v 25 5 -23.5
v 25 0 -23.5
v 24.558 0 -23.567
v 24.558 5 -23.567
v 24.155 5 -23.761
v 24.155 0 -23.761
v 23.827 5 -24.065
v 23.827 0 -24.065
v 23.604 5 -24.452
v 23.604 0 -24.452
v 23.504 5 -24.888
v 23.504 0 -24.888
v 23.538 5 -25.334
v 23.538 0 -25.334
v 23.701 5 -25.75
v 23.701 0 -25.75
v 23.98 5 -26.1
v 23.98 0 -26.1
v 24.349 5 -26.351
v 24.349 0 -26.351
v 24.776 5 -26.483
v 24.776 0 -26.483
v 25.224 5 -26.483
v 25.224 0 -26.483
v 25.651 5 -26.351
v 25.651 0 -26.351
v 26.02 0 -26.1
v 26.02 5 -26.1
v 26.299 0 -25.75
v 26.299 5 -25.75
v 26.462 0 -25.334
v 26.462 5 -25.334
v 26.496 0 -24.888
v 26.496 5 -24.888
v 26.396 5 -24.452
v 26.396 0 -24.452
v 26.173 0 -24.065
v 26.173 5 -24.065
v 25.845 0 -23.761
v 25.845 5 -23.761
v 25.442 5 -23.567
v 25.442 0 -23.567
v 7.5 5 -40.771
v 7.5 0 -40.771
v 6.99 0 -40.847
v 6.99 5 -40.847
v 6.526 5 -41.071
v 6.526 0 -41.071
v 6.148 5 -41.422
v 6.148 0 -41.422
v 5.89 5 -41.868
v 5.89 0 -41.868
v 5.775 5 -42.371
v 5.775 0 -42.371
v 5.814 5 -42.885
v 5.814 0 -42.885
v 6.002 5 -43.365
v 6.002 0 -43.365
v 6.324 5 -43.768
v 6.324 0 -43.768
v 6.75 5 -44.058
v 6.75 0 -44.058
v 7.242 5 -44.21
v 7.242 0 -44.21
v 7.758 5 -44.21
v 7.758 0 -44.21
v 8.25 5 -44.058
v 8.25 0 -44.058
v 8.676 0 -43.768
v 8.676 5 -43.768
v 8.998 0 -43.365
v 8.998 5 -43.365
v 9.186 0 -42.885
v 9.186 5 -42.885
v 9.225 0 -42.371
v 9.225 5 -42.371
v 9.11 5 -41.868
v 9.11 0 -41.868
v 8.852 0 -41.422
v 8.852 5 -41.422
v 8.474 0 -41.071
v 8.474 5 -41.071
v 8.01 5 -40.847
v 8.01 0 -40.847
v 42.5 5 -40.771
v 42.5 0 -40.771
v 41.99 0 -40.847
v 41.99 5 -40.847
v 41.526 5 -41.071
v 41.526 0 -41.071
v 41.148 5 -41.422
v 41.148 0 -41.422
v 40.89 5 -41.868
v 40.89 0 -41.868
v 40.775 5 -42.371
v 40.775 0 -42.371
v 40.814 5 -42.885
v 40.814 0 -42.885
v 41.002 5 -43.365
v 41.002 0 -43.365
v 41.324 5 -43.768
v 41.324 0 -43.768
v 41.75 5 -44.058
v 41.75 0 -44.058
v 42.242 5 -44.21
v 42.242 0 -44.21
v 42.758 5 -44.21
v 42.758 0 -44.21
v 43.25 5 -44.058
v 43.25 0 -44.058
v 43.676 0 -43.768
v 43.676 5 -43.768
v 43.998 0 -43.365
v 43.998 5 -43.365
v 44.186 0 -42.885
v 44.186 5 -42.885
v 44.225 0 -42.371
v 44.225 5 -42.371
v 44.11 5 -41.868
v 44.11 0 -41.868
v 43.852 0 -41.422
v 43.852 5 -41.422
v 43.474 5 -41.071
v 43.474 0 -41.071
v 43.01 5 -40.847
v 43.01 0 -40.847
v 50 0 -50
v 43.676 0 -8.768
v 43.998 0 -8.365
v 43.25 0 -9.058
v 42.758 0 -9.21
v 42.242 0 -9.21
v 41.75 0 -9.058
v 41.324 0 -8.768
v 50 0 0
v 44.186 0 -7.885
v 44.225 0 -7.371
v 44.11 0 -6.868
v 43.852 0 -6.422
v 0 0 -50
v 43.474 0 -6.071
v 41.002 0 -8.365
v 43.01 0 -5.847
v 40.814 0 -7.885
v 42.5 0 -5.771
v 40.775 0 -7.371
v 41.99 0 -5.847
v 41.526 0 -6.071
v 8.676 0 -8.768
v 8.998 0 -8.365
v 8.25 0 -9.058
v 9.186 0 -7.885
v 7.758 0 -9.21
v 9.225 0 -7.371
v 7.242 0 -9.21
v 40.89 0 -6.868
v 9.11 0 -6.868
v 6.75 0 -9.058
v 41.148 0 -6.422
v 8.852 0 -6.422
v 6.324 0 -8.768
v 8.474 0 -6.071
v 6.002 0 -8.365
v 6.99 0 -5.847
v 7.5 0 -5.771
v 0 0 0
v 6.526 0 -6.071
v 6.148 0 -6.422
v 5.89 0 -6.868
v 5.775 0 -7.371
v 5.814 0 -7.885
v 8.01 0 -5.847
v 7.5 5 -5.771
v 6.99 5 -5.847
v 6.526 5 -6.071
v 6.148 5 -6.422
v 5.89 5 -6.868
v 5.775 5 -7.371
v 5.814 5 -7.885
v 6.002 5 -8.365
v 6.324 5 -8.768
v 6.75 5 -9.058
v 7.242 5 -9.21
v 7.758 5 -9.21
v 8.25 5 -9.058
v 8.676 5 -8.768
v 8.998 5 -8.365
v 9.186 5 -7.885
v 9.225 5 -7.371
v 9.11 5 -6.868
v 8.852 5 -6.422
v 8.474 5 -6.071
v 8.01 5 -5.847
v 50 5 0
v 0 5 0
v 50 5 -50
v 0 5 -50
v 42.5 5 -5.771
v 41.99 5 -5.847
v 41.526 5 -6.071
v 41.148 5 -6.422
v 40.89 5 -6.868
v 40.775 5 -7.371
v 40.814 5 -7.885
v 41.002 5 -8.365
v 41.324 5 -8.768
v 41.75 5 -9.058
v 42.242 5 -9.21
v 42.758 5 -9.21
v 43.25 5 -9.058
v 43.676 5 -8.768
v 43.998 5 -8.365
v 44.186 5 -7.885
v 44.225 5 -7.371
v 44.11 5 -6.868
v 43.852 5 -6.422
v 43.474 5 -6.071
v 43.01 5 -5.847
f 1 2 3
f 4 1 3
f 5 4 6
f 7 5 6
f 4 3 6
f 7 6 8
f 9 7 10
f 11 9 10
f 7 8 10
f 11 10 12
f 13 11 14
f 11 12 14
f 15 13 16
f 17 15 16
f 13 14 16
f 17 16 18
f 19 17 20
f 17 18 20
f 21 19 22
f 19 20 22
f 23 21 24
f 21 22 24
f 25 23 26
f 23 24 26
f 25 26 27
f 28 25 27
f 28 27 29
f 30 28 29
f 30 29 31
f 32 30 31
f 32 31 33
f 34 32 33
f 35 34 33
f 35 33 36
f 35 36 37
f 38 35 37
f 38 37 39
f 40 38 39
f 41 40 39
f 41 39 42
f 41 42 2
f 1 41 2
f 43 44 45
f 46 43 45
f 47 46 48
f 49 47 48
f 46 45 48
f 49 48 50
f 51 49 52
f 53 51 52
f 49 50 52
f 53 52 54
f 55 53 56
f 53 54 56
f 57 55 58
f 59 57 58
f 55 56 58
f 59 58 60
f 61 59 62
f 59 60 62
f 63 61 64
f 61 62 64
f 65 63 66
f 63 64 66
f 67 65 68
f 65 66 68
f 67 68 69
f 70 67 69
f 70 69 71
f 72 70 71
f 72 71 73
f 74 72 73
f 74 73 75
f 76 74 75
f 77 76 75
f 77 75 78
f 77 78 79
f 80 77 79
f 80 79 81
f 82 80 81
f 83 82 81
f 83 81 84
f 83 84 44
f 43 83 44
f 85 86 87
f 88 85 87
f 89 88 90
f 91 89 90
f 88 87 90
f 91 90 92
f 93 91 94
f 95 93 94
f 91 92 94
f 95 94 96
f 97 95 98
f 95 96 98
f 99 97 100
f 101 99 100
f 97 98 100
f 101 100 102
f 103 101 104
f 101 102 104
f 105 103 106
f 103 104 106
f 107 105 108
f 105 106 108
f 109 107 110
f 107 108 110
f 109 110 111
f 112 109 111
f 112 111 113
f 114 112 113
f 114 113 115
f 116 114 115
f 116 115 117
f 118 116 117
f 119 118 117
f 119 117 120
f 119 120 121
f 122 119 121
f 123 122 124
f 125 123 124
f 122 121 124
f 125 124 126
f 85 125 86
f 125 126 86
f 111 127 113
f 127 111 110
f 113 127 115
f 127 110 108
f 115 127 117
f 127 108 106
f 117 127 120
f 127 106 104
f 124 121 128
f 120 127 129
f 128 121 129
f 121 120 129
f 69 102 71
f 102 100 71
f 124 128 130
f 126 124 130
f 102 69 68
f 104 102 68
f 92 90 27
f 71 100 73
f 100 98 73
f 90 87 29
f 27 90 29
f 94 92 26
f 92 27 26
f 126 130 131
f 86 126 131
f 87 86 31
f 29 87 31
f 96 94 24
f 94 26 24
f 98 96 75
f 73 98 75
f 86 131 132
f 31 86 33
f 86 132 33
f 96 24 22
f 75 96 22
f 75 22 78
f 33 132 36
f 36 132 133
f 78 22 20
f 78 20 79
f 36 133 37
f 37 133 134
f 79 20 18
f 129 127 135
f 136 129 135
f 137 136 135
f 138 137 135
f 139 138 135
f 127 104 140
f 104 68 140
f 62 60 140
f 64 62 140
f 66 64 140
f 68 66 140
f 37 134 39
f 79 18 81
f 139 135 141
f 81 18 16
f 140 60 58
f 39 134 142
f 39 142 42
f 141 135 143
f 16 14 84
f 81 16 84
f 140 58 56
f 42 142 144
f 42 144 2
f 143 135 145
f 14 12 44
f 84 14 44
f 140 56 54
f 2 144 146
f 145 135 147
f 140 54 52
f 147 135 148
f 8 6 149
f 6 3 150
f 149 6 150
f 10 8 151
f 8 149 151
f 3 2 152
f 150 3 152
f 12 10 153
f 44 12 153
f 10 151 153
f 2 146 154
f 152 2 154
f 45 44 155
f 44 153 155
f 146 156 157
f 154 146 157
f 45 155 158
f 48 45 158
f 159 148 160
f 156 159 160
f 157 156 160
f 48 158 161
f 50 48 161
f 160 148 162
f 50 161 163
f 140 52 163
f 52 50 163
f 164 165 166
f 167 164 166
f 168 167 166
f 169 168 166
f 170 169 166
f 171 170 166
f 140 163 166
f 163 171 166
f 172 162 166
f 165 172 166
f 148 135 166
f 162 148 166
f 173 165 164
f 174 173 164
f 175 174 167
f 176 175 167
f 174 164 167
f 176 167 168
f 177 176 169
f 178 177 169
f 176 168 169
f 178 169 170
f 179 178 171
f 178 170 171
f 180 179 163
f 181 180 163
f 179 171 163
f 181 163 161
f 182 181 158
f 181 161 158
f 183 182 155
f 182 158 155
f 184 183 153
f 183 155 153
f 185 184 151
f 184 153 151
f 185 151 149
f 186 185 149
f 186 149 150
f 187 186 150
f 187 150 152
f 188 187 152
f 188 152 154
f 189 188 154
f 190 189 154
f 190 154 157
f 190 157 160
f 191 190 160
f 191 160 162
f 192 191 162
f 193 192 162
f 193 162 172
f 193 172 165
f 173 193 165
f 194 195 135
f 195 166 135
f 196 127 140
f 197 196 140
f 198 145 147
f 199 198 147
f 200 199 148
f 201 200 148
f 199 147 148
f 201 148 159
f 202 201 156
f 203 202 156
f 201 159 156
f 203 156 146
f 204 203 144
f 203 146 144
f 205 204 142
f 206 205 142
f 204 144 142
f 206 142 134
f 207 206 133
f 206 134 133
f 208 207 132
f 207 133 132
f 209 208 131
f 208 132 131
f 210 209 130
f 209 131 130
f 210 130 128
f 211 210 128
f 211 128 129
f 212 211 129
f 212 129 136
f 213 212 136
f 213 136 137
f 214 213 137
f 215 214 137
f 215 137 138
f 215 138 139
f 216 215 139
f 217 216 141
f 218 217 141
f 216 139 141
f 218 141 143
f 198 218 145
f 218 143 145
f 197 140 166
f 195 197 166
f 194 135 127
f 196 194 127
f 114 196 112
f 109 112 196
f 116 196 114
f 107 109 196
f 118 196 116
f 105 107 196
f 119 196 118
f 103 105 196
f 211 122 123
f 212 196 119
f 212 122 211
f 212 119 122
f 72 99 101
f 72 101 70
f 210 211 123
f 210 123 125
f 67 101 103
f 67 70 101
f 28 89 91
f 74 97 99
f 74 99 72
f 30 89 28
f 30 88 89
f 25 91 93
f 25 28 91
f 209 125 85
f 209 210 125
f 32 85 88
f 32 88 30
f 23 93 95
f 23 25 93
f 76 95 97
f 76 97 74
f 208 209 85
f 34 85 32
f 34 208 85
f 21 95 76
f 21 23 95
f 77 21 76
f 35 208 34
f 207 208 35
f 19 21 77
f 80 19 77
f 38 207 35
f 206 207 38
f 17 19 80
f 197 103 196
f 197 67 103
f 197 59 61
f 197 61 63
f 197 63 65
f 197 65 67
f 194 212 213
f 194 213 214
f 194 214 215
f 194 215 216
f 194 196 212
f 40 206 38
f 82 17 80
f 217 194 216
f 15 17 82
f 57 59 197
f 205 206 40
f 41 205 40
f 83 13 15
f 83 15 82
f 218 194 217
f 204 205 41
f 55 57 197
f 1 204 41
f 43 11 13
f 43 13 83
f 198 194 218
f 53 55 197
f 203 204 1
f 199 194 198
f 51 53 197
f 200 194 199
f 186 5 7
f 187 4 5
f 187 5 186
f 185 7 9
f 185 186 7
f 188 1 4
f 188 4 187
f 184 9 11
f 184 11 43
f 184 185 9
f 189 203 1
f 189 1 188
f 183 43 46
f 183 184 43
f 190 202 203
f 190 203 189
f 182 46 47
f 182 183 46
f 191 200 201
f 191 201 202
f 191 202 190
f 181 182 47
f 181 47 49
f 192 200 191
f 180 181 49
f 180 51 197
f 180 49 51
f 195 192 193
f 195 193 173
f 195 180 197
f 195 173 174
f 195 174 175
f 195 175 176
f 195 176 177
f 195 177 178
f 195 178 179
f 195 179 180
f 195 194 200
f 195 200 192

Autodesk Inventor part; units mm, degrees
ref_plane "YZ Plane" through (0, 0, 0) normal (1, 0, 0) x (0, 1, 0)
ref_plane "XZ Plane" through (0, 0, 0) normal (0, 1, 0) x (-1, 0, 0)
ref_plane "XY Plane" through (0, 0, 0) normal (0, 0, 1) x (1, 0, 0)
sketch "Sketch1" plane through (0, 0, 0) normal (0, 1, 0) x (-1, 0, 0)
  line L0 (0, 0) -> (-50, 0)
  line L1 (-50, 0) -> (-50, -50)
  line L2 (-50, -50) -> (0, -50)
  line L3 (0, -50) -> (0, 0)
  point P0 (-7.5, -7.5)
  point P1 (-7.5, -42.5)
  point P2 (-42.5, -42.5)
  point P3 (-42.5, -7.5)
  dimension "d0" = 50
  dimension "d1" = 50
  dimension "d2" = 35
  dimension "d3" = 7.5
  dimension "d4" = 35
  dimension "d5" = 35
  dimension "d6" = 7.5
  dimension "d7" = 7.5
  dimension "d23" = 35
  dimension "d24" = 7.5
extrude "Extrusion1" add sketch "Sketch1" along normal blind 5
sketch "Sketch2" plane through (0, 5, 0) normal (0, 1, 0) x (1, 0, 0)
  line L0 (50, 50) -> (0, 50) projected
  line L1 (0, 50) -> (0, 0) projected
  point P0 (7.5, 7.5)
  point P1 (7.5, 42.5)
  point P2 (42.5, 42.5)
  point P3 (42.5, 7.5)
  dimension "d10" = 35
  dimension "d11" = 35
  dimension "d12" = 35
  dimension "d13" = 7.5
  dimension "d14" = 7.5
  dimension "d15" = 7.5
  dimension "d25" = 35
  dimension "d26" = 7.5
hole "Hole1" at (7.5, 5, -7.5) at (7.5, 5, -42.5) at (42.5, 5, -42.5) at (42.5, 5, -7.5) direction (0, -1, 0) diameter 3.4587 end through all thread size "M4x0.5" class "6H" standard "ISO Metric profile"
sketch "Sketch3" plane through (0, 5, 0) normal (0, 1, 0) x (1, 0, 0)
  line L0 (0, 0) -> (50, 0) projected
  line L1 (0, 50) -> (0, 0) projected
  point P0 (25, 25)
  dimension "d27" = 25
  dimension "d28" = 25
hole "Hole2" at (25, 5, -25) direction (0, -1, 0) diameter 3 end through all
equation "\"d21\" = Thickness"
equation "\"BendRadius\" = Thickness"
equation "\"BendReliefWidth\" = Thickness"
equation "\"BendReliefDepth\" = 0.5 * Thickness"
equation "\"CornerReliefSize\" = 4 * Thickness"
equation "\"MinimumRemnant\" = 2 * Thickness"
equation "\"TransitionRadius\" = BendRadius"
equation "\"JacobiRadiusSize\" = BendRadius"
equation "\"GapSize\" = Thickness"
equation "\"Thickness\" = 0.5"
properties part number "Bottom link plate"
